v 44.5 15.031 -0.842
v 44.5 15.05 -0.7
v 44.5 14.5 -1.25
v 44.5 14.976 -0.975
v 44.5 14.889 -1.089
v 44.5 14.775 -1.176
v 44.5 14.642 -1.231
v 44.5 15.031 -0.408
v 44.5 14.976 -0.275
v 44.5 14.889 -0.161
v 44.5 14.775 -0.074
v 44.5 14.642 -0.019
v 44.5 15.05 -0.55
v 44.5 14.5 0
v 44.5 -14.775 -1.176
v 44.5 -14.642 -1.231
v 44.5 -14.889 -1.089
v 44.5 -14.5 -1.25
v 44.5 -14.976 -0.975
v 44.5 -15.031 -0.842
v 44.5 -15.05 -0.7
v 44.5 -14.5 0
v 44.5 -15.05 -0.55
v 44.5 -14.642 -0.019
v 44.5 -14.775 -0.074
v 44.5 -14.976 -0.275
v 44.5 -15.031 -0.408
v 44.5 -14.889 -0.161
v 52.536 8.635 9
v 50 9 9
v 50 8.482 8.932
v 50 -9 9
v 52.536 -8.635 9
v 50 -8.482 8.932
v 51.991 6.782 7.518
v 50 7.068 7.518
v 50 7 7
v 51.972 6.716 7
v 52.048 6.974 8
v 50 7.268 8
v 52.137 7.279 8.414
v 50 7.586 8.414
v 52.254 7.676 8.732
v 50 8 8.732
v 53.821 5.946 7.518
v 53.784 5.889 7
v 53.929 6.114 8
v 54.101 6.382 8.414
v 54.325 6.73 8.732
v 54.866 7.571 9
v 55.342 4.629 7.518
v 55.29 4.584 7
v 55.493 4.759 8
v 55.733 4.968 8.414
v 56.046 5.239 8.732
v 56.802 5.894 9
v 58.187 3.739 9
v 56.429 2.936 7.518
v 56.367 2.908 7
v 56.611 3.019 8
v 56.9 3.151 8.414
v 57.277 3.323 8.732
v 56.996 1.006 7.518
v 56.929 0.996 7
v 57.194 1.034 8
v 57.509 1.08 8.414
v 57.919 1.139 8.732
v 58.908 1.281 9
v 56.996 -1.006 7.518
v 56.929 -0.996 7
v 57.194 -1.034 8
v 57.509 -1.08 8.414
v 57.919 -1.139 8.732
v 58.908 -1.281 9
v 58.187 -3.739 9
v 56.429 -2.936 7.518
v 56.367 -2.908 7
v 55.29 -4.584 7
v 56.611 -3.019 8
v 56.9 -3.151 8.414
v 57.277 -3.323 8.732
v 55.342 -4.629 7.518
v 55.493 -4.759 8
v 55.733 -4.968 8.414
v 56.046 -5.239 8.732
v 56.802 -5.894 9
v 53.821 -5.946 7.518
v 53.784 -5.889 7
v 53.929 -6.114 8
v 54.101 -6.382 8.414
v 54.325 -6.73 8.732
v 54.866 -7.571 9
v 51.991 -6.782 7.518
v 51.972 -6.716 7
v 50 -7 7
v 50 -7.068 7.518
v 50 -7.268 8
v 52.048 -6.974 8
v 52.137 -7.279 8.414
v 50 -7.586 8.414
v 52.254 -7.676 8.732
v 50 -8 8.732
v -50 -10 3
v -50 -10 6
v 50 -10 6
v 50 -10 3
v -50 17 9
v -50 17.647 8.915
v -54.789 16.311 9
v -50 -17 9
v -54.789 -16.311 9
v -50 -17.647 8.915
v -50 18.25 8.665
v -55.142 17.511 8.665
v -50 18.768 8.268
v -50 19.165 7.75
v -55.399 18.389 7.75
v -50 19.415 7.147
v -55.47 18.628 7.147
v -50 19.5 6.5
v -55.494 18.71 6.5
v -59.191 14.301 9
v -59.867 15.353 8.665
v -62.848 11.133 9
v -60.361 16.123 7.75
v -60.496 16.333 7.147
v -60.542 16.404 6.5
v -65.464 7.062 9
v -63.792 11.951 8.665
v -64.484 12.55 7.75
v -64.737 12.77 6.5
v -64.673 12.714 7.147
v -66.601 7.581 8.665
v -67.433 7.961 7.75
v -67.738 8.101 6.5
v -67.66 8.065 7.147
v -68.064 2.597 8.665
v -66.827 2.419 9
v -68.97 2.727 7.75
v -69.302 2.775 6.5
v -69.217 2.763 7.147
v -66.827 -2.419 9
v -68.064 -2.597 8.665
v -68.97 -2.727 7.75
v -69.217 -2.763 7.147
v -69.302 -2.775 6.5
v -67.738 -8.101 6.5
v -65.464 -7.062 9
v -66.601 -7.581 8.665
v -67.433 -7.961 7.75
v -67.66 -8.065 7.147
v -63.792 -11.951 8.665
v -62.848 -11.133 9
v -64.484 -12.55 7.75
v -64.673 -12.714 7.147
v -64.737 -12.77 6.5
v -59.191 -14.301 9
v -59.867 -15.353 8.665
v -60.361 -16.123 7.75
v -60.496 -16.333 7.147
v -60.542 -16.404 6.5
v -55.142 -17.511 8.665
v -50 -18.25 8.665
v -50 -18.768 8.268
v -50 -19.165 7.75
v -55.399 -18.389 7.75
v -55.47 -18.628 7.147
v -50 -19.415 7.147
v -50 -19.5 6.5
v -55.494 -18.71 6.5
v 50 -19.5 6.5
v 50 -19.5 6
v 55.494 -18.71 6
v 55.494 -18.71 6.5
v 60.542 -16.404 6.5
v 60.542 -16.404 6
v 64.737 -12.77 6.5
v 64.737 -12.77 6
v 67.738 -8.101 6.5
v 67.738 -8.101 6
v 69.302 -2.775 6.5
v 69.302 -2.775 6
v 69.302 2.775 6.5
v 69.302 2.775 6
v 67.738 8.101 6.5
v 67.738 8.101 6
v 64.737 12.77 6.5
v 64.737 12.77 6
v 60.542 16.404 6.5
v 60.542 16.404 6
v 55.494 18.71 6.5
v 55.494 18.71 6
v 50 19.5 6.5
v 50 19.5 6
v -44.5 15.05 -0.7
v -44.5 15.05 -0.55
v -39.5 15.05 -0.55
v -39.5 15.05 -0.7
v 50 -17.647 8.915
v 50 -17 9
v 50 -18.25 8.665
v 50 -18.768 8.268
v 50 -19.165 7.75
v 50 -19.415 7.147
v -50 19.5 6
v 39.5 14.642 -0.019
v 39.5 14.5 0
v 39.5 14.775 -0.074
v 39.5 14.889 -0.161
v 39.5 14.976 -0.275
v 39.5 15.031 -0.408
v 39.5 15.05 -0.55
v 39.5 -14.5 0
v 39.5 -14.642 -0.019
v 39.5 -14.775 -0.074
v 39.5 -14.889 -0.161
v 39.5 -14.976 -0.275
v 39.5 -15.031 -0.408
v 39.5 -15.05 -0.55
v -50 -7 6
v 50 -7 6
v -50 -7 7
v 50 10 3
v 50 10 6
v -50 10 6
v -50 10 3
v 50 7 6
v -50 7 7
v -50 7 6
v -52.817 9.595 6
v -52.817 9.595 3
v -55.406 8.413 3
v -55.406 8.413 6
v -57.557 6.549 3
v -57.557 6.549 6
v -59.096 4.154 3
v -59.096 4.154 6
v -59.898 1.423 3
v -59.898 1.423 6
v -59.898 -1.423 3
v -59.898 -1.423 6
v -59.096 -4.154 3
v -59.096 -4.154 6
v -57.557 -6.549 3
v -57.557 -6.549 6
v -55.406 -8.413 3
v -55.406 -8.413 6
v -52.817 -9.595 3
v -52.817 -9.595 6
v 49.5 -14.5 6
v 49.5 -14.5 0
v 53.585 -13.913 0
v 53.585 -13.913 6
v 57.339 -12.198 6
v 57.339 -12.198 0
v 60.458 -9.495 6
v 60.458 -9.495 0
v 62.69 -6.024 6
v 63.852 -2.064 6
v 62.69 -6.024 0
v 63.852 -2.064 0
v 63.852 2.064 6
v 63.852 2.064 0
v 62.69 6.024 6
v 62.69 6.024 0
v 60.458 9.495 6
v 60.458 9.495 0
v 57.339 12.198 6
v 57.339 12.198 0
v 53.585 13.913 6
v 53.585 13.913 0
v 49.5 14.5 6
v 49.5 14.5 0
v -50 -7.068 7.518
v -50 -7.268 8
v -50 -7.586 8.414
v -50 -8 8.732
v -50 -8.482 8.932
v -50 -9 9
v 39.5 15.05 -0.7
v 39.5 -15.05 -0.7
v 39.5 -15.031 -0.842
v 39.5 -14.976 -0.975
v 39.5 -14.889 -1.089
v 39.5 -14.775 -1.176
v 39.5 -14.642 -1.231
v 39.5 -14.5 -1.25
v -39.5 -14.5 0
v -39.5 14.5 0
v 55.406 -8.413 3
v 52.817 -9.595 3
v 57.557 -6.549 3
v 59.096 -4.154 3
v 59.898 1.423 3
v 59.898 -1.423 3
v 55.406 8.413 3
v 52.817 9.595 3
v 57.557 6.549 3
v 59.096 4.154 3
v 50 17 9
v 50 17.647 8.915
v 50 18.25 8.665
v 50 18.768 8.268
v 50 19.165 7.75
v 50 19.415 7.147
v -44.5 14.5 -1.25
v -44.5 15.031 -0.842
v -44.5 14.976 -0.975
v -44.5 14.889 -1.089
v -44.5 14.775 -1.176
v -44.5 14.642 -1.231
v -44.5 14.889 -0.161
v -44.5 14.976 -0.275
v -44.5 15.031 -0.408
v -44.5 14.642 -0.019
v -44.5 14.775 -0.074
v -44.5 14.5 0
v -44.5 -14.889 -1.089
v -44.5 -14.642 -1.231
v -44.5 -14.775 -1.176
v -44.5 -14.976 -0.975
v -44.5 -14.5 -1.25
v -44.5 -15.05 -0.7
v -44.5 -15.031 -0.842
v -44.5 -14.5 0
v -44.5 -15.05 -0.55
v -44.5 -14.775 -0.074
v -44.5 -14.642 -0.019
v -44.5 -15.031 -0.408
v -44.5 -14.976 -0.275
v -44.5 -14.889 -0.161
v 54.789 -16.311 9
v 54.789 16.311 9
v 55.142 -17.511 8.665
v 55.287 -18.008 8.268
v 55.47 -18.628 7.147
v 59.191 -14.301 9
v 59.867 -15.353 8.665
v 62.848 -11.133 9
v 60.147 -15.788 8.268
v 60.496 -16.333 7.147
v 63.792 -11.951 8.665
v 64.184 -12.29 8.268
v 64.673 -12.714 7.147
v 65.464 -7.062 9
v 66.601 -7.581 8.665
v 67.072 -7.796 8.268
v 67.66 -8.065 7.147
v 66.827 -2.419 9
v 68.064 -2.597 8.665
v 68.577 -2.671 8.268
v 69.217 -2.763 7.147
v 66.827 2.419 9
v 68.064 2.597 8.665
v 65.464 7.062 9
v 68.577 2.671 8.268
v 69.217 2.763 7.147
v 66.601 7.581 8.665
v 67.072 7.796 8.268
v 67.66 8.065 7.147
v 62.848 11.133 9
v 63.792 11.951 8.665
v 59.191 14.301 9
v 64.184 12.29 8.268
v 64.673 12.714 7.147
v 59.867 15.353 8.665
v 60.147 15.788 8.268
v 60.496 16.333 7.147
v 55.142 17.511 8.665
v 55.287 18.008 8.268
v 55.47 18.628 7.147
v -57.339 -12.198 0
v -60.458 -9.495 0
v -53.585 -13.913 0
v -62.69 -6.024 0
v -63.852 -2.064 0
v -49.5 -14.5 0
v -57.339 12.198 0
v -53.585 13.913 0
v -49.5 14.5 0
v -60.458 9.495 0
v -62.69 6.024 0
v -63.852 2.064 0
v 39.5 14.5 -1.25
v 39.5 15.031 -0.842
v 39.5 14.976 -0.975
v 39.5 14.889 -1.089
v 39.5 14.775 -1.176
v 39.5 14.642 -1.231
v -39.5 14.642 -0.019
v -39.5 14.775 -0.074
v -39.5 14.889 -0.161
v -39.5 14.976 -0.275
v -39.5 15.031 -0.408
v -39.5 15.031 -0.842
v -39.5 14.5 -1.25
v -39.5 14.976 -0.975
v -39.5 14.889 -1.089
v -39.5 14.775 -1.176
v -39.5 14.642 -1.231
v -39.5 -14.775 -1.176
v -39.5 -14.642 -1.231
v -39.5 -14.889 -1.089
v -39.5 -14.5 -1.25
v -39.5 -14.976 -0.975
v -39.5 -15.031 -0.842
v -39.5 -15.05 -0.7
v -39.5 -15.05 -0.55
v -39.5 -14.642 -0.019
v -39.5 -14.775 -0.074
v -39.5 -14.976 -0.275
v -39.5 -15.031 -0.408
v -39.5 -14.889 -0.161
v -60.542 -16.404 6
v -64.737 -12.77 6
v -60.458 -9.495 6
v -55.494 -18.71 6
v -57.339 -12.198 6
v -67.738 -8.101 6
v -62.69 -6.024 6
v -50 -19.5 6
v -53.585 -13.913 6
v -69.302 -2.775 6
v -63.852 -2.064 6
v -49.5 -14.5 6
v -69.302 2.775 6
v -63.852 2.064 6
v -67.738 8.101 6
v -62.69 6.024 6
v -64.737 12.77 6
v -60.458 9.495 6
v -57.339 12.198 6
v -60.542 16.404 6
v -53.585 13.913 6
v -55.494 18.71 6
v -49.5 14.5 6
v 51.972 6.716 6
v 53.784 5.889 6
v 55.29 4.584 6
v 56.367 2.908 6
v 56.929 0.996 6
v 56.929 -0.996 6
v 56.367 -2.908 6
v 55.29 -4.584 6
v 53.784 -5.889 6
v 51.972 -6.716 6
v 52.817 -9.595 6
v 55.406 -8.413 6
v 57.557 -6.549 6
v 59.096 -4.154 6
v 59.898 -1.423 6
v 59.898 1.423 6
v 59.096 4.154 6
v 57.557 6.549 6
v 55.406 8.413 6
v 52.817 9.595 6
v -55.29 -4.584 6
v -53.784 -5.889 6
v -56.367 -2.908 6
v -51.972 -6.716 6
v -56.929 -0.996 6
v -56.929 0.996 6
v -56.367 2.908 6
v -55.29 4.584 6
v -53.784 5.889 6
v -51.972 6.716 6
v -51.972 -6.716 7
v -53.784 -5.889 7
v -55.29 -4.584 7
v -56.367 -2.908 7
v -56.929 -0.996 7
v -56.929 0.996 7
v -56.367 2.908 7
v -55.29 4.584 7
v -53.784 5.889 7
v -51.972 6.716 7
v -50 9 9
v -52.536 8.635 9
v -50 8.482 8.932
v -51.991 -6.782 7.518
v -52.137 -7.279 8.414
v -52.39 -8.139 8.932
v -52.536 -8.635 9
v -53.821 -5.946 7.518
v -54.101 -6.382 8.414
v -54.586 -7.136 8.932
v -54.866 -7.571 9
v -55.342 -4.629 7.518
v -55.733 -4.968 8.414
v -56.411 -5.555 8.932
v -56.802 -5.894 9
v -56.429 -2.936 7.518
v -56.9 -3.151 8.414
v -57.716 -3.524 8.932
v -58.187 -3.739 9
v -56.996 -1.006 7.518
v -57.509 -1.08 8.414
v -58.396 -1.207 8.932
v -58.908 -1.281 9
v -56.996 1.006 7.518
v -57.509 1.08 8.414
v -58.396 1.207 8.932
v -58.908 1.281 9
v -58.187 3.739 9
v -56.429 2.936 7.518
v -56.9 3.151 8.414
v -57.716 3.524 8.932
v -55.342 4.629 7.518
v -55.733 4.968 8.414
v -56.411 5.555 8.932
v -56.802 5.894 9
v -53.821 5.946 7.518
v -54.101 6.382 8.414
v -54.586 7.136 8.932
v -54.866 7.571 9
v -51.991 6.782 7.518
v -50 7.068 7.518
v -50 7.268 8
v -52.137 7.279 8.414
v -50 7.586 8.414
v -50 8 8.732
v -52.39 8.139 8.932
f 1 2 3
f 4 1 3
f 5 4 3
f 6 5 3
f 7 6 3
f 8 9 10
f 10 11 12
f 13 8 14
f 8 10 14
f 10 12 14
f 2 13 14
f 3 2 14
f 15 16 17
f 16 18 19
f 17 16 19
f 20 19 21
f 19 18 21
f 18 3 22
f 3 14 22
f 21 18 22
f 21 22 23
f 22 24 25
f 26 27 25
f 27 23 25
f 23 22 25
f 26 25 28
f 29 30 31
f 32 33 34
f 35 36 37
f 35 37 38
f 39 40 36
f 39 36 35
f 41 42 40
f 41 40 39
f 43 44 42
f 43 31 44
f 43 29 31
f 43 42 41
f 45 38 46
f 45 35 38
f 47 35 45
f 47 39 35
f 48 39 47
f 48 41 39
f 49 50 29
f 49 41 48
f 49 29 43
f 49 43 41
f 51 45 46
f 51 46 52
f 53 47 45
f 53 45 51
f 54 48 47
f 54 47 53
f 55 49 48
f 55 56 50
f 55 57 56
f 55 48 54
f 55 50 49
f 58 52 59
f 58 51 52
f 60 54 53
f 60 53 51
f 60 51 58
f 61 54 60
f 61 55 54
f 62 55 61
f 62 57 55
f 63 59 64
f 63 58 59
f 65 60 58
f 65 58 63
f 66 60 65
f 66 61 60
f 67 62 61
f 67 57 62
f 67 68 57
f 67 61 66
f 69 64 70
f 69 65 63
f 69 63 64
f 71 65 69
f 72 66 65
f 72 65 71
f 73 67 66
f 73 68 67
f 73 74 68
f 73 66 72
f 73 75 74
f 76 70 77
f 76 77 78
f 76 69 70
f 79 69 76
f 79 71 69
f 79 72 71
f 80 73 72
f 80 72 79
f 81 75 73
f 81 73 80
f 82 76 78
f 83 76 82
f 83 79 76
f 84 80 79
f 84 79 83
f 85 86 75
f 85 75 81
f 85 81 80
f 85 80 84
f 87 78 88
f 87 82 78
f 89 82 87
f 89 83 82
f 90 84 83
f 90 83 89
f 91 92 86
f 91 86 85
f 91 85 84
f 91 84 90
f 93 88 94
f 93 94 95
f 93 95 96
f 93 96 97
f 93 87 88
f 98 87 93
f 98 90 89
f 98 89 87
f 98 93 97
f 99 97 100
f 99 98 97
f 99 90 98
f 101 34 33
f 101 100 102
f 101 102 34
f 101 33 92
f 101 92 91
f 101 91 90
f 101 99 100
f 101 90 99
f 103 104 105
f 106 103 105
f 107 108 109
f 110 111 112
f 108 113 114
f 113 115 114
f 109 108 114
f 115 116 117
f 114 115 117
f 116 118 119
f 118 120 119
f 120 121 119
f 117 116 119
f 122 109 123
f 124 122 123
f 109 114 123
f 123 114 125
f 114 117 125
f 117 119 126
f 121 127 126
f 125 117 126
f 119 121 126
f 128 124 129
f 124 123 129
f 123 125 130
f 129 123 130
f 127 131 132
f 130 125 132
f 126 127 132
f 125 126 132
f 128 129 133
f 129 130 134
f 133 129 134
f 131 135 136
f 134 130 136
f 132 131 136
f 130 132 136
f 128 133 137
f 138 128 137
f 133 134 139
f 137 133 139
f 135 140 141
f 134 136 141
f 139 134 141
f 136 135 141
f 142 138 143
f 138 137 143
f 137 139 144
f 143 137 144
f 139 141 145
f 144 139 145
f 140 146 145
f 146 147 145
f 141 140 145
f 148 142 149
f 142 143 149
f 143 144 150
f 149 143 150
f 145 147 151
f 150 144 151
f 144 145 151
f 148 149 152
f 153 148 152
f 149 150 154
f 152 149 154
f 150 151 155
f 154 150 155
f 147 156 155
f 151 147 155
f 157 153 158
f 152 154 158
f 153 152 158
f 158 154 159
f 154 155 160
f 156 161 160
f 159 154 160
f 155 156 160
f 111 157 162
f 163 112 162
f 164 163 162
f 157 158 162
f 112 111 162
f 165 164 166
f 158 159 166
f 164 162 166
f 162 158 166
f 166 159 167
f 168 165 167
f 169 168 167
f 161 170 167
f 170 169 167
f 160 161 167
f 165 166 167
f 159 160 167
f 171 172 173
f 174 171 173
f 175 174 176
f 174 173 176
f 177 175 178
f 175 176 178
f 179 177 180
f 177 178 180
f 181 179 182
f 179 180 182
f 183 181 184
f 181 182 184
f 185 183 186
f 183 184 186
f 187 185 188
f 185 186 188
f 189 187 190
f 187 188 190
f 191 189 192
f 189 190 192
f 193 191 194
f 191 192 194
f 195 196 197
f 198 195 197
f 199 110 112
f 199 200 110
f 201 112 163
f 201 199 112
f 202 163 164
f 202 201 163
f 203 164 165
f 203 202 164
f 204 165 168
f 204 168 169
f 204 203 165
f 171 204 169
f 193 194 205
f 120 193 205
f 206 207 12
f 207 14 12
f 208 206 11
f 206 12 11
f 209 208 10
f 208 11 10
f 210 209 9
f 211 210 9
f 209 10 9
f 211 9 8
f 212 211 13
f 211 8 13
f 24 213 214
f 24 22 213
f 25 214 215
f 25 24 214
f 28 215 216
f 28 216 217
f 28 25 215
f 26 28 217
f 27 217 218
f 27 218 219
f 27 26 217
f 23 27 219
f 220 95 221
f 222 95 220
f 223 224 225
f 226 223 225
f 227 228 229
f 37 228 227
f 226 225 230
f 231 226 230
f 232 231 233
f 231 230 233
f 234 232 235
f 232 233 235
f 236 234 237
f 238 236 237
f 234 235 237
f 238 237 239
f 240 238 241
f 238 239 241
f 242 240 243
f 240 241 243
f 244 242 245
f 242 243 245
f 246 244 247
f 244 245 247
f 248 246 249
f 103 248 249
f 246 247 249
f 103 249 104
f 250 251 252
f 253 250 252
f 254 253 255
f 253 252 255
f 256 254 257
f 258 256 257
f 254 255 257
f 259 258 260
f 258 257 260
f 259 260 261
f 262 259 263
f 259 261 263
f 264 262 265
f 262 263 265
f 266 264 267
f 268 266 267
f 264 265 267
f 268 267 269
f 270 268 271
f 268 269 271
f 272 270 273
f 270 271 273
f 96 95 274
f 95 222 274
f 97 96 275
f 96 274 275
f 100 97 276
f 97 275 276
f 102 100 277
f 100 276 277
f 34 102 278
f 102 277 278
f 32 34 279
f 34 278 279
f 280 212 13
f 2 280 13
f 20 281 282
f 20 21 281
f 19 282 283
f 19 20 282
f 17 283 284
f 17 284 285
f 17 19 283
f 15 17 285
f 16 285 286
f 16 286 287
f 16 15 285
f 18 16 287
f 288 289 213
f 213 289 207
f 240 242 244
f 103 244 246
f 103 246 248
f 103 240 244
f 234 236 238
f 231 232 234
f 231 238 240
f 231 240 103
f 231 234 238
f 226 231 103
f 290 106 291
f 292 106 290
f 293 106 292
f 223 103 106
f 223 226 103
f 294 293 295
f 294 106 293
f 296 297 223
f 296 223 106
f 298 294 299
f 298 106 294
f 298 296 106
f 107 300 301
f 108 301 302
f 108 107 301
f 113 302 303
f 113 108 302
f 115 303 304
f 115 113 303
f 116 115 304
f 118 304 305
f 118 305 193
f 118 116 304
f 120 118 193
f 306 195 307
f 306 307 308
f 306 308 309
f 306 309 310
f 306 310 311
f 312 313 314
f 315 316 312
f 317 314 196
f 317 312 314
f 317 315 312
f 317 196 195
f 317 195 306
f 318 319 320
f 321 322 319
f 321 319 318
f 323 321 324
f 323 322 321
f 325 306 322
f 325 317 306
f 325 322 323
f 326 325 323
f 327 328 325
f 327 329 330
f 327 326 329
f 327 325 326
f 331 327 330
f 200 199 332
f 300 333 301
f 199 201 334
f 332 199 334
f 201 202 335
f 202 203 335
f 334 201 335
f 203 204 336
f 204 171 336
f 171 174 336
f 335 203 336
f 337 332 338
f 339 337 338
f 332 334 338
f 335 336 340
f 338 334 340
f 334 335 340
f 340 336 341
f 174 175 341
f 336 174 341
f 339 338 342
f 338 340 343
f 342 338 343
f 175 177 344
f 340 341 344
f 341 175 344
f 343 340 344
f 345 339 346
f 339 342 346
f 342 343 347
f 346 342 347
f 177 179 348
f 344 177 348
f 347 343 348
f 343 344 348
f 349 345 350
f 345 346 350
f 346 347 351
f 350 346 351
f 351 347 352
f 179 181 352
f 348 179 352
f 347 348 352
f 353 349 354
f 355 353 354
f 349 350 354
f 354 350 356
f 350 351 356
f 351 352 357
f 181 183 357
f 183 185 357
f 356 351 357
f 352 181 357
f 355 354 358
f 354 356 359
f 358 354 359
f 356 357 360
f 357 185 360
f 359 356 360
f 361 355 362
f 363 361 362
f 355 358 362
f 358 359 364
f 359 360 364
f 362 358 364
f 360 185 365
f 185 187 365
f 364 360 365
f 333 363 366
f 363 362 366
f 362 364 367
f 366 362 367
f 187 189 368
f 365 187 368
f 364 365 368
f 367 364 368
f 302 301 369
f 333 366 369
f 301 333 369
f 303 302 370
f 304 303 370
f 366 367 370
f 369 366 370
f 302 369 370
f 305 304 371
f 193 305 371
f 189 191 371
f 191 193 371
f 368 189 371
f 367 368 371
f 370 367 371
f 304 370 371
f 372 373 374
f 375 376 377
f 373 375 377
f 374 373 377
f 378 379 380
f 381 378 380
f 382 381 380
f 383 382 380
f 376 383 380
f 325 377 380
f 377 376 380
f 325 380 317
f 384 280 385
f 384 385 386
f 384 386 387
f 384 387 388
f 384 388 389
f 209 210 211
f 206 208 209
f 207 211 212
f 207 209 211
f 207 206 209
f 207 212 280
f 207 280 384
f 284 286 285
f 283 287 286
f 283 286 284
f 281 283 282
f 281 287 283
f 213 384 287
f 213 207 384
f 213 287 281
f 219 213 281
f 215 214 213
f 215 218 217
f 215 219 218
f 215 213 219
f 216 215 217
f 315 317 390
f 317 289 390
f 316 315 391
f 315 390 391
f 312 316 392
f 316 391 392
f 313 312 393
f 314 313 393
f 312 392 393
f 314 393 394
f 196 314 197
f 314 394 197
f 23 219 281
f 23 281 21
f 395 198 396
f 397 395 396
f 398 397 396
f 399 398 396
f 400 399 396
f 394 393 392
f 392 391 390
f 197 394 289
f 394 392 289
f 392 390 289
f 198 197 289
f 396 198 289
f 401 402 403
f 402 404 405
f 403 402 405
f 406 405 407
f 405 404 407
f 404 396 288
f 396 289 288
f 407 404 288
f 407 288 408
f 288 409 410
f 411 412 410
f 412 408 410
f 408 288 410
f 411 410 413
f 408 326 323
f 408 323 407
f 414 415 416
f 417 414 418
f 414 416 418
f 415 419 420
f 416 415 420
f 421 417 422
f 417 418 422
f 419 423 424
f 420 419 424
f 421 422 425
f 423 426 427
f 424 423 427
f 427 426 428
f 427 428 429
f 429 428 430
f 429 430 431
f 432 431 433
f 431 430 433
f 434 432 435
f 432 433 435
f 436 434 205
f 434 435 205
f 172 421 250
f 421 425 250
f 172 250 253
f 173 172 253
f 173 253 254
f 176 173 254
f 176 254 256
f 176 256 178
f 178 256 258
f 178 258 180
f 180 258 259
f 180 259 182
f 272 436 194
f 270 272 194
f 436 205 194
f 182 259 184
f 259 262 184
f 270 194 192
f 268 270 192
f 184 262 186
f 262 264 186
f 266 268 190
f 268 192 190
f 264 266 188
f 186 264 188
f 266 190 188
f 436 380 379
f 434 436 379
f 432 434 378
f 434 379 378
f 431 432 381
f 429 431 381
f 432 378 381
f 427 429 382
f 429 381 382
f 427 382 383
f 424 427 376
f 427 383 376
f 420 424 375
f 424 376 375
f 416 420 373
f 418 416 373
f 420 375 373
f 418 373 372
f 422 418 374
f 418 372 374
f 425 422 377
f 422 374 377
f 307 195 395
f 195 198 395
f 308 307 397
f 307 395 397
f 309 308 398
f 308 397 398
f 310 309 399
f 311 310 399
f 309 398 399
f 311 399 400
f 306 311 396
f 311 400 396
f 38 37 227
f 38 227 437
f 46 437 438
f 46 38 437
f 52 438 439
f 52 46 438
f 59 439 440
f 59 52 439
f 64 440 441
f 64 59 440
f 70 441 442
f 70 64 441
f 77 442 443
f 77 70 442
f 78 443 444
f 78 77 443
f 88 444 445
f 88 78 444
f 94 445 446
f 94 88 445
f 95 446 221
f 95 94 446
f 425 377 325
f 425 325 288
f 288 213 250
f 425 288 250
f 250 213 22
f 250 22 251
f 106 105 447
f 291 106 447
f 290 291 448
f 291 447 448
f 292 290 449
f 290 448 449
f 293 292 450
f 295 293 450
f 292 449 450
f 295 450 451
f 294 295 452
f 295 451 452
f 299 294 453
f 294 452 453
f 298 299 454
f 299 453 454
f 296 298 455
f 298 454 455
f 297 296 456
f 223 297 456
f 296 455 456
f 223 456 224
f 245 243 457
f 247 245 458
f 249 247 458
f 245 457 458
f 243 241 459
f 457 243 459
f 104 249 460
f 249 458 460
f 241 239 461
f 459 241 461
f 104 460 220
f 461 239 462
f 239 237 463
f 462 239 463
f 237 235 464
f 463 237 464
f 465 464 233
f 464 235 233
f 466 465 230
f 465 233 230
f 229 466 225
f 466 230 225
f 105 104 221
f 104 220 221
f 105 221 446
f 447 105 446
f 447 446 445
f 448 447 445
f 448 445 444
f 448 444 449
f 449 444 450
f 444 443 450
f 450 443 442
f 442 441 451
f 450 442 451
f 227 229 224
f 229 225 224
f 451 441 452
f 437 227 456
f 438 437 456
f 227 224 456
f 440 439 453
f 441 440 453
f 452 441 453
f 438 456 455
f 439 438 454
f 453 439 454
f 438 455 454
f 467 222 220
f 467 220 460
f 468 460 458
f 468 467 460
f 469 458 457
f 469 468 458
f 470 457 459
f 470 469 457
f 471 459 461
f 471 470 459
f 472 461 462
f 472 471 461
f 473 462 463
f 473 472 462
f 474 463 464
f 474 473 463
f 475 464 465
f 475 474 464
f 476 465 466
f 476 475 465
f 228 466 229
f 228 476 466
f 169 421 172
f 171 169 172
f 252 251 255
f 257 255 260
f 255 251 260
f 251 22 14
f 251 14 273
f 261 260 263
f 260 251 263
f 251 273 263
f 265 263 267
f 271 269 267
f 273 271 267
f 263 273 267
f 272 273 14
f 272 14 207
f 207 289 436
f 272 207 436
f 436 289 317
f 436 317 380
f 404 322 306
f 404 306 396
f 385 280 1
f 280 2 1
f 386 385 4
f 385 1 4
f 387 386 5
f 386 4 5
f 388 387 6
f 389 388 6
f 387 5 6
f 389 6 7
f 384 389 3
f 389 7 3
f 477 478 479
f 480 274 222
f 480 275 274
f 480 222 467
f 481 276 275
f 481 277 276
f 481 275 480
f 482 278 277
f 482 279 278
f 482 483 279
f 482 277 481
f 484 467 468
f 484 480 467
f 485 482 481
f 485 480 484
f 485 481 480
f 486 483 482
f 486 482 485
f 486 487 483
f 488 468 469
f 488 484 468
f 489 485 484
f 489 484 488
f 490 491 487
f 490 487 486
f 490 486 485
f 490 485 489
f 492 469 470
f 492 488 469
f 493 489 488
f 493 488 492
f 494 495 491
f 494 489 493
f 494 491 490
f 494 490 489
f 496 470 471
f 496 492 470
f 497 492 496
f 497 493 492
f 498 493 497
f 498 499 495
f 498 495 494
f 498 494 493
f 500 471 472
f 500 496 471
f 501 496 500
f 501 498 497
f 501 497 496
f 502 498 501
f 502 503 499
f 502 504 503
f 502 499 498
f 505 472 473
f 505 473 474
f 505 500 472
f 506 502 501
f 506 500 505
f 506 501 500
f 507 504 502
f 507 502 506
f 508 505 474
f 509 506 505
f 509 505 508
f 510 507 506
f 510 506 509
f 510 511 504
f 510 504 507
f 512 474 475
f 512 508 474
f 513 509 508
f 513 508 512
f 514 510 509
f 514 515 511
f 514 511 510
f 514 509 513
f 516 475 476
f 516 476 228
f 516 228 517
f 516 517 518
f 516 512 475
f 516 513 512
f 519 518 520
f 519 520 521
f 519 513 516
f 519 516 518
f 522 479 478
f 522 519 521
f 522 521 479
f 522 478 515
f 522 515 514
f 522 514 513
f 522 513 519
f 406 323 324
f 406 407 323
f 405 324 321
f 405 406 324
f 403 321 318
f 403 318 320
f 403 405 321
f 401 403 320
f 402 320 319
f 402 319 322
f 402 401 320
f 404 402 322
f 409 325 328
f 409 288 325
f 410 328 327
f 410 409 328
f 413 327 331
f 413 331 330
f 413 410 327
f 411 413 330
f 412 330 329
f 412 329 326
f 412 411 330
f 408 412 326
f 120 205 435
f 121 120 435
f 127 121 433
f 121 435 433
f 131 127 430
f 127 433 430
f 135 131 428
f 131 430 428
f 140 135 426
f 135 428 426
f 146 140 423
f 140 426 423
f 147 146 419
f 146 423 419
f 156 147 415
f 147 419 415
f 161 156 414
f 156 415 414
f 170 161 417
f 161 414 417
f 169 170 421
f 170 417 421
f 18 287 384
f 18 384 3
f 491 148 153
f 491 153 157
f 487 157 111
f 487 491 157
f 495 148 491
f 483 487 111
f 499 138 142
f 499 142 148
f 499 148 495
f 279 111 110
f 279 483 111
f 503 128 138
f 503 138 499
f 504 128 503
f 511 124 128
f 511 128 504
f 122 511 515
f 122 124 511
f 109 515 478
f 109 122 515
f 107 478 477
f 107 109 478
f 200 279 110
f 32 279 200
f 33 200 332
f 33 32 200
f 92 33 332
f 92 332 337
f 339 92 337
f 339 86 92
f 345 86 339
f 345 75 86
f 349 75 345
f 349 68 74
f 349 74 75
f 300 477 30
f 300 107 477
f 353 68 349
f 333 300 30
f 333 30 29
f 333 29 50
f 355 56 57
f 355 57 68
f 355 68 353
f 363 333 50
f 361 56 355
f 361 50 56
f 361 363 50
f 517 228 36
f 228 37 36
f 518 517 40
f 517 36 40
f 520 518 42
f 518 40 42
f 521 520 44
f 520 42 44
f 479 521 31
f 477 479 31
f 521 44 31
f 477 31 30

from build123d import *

# Parameters (mm, degrees)
F1_DEPTH  = 6
F3_DEPTH  = 3
F4_R      = 2.5
F5_W      = 5
F5_H      = 30.1
F6_DEPTH  = 1.25
F8_DEPTH  = 6
F10_DEPTH = 3
F11_R     = 2
F12_R     = 0.54999


# Not quite as in the source:
# - a fillet or chamfer is up to 0.001 mm smaller than in the source, because OpenCascade refuses the exact size


with BuildPart() as f1:
    # F0 (on Top) → F1 (new body)
    with BuildSketch(Plane.XY):
        with BuildLine():
            Line((49.5, 14.5), (-49.5, 14.5))
            ThreePointArc((-49.5, 14.5), (-64, 0), (-49.5, -14.5))
            Line((-49.5, -14.5), (49.5, -14.5))
            ThreePointArc((49.5, -14.5), (64, 0), (49.5, 14.5))
        make_face()
    extrude(amount=F1_DEPTH)

    # F2 (on face) → F3 (join)
    with BuildSketch(Plane.XY.offset(6)):
        with BuildLine():
            Line((50, 19.5), (-50, 19.5))
            ThreePointArc((-50, 19.5), (-69.5, 0), (-50, -19.5))
            Line((-50, -19.5), (50, -19.5))
            ThreePointArc((50, -19.5), (69.5, 0), (50, 19.5))
        make_face()
    extrude(amount=F3_DEPTH)

    # F4
    f4_edges = [f1.edges().sort_by_distance(p)[0] for p in [
        (0, -19.5, 9),
    ]]
    fillet(f4_edges, radius=F4_R)

    # F5 (on face) → F6 (join)
    with BuildSketch(Plane(origin=(0, 0, 0), x_dir=(1, 0, 0), z_dir=(0, 0, -1))):
        with Locations((-42, 0)):
            Rectangle(F5_W, F5_H)
        with Locations((42, 0)):
            Rectangle(F5_W, F5_H)
    extrude(amount=F6_DEPTH)

    # F7 (on face) → F8 (cut)
    with BuildSketch(Plane.XY.offset(9)):
        with BuildLine():
            Line((50, 10), (-50, 10))
            ThreePointArc((-50, 10), (-60, 0), (-50, -10))
            Line((-50, -10), (50, -10))
            ThreePointArc((50, -10), (60, 0), (50, 10))
        make_face()
    extrude(amount=-F8_DEPTH, mode=Mode.SUBTRACT)

    # F9 (on face) → F10 (join)
    with BuildSketch(Plane.XY.offset(9)):
        with BuildLine():
            Line((50, 10), (-50, 10))
            ThreePointArc((-50, 10), (-60, 0), (-50, -10))
            Line((-50, -10), (50, -10))
            ThreePointArc((50, -10), (60, 0), (50, 10))
        make_face()
        with BuildLine():
            ThreePointArc((50, 7), (57, 0), (50, -7))
            Line((50, -7), (-50, -7))
            ThreePointArc((-50, -7), (-57, 0), (-50, 7))
            Line((-50, 7), (50, 7))
        make_face(mode=Mode.SUBTRACT)
    extrude(amount=-F10_DEPTH)

    # F11
    f11_edges = [f1.edges().sort_by_distance(p)[0] for p in [
        (0, 7, 9),
    ]]
    fillet(f11_edges, radius=F11_R)

    # F12 (radius 0.55 in the source; OpenCascade refuses exactly that, so slightly less here)
    f12_edges = [f1.edges().sort_by_distance(p)[0] for p in [
        (-42, -15.05, 0),
        (-42, -15.05, -1.25),
        (42, -15.05, -1.25),
        (42, -15.05, 0),
        (-42, 15.05, -1.25),
        (-42, 15.05, 0),
        (42, 15.05, 0),
        (42, 15.05, -1.25),
    ]]
    fillet(f12_edges, radius=F12_R)


solid = f1.part
